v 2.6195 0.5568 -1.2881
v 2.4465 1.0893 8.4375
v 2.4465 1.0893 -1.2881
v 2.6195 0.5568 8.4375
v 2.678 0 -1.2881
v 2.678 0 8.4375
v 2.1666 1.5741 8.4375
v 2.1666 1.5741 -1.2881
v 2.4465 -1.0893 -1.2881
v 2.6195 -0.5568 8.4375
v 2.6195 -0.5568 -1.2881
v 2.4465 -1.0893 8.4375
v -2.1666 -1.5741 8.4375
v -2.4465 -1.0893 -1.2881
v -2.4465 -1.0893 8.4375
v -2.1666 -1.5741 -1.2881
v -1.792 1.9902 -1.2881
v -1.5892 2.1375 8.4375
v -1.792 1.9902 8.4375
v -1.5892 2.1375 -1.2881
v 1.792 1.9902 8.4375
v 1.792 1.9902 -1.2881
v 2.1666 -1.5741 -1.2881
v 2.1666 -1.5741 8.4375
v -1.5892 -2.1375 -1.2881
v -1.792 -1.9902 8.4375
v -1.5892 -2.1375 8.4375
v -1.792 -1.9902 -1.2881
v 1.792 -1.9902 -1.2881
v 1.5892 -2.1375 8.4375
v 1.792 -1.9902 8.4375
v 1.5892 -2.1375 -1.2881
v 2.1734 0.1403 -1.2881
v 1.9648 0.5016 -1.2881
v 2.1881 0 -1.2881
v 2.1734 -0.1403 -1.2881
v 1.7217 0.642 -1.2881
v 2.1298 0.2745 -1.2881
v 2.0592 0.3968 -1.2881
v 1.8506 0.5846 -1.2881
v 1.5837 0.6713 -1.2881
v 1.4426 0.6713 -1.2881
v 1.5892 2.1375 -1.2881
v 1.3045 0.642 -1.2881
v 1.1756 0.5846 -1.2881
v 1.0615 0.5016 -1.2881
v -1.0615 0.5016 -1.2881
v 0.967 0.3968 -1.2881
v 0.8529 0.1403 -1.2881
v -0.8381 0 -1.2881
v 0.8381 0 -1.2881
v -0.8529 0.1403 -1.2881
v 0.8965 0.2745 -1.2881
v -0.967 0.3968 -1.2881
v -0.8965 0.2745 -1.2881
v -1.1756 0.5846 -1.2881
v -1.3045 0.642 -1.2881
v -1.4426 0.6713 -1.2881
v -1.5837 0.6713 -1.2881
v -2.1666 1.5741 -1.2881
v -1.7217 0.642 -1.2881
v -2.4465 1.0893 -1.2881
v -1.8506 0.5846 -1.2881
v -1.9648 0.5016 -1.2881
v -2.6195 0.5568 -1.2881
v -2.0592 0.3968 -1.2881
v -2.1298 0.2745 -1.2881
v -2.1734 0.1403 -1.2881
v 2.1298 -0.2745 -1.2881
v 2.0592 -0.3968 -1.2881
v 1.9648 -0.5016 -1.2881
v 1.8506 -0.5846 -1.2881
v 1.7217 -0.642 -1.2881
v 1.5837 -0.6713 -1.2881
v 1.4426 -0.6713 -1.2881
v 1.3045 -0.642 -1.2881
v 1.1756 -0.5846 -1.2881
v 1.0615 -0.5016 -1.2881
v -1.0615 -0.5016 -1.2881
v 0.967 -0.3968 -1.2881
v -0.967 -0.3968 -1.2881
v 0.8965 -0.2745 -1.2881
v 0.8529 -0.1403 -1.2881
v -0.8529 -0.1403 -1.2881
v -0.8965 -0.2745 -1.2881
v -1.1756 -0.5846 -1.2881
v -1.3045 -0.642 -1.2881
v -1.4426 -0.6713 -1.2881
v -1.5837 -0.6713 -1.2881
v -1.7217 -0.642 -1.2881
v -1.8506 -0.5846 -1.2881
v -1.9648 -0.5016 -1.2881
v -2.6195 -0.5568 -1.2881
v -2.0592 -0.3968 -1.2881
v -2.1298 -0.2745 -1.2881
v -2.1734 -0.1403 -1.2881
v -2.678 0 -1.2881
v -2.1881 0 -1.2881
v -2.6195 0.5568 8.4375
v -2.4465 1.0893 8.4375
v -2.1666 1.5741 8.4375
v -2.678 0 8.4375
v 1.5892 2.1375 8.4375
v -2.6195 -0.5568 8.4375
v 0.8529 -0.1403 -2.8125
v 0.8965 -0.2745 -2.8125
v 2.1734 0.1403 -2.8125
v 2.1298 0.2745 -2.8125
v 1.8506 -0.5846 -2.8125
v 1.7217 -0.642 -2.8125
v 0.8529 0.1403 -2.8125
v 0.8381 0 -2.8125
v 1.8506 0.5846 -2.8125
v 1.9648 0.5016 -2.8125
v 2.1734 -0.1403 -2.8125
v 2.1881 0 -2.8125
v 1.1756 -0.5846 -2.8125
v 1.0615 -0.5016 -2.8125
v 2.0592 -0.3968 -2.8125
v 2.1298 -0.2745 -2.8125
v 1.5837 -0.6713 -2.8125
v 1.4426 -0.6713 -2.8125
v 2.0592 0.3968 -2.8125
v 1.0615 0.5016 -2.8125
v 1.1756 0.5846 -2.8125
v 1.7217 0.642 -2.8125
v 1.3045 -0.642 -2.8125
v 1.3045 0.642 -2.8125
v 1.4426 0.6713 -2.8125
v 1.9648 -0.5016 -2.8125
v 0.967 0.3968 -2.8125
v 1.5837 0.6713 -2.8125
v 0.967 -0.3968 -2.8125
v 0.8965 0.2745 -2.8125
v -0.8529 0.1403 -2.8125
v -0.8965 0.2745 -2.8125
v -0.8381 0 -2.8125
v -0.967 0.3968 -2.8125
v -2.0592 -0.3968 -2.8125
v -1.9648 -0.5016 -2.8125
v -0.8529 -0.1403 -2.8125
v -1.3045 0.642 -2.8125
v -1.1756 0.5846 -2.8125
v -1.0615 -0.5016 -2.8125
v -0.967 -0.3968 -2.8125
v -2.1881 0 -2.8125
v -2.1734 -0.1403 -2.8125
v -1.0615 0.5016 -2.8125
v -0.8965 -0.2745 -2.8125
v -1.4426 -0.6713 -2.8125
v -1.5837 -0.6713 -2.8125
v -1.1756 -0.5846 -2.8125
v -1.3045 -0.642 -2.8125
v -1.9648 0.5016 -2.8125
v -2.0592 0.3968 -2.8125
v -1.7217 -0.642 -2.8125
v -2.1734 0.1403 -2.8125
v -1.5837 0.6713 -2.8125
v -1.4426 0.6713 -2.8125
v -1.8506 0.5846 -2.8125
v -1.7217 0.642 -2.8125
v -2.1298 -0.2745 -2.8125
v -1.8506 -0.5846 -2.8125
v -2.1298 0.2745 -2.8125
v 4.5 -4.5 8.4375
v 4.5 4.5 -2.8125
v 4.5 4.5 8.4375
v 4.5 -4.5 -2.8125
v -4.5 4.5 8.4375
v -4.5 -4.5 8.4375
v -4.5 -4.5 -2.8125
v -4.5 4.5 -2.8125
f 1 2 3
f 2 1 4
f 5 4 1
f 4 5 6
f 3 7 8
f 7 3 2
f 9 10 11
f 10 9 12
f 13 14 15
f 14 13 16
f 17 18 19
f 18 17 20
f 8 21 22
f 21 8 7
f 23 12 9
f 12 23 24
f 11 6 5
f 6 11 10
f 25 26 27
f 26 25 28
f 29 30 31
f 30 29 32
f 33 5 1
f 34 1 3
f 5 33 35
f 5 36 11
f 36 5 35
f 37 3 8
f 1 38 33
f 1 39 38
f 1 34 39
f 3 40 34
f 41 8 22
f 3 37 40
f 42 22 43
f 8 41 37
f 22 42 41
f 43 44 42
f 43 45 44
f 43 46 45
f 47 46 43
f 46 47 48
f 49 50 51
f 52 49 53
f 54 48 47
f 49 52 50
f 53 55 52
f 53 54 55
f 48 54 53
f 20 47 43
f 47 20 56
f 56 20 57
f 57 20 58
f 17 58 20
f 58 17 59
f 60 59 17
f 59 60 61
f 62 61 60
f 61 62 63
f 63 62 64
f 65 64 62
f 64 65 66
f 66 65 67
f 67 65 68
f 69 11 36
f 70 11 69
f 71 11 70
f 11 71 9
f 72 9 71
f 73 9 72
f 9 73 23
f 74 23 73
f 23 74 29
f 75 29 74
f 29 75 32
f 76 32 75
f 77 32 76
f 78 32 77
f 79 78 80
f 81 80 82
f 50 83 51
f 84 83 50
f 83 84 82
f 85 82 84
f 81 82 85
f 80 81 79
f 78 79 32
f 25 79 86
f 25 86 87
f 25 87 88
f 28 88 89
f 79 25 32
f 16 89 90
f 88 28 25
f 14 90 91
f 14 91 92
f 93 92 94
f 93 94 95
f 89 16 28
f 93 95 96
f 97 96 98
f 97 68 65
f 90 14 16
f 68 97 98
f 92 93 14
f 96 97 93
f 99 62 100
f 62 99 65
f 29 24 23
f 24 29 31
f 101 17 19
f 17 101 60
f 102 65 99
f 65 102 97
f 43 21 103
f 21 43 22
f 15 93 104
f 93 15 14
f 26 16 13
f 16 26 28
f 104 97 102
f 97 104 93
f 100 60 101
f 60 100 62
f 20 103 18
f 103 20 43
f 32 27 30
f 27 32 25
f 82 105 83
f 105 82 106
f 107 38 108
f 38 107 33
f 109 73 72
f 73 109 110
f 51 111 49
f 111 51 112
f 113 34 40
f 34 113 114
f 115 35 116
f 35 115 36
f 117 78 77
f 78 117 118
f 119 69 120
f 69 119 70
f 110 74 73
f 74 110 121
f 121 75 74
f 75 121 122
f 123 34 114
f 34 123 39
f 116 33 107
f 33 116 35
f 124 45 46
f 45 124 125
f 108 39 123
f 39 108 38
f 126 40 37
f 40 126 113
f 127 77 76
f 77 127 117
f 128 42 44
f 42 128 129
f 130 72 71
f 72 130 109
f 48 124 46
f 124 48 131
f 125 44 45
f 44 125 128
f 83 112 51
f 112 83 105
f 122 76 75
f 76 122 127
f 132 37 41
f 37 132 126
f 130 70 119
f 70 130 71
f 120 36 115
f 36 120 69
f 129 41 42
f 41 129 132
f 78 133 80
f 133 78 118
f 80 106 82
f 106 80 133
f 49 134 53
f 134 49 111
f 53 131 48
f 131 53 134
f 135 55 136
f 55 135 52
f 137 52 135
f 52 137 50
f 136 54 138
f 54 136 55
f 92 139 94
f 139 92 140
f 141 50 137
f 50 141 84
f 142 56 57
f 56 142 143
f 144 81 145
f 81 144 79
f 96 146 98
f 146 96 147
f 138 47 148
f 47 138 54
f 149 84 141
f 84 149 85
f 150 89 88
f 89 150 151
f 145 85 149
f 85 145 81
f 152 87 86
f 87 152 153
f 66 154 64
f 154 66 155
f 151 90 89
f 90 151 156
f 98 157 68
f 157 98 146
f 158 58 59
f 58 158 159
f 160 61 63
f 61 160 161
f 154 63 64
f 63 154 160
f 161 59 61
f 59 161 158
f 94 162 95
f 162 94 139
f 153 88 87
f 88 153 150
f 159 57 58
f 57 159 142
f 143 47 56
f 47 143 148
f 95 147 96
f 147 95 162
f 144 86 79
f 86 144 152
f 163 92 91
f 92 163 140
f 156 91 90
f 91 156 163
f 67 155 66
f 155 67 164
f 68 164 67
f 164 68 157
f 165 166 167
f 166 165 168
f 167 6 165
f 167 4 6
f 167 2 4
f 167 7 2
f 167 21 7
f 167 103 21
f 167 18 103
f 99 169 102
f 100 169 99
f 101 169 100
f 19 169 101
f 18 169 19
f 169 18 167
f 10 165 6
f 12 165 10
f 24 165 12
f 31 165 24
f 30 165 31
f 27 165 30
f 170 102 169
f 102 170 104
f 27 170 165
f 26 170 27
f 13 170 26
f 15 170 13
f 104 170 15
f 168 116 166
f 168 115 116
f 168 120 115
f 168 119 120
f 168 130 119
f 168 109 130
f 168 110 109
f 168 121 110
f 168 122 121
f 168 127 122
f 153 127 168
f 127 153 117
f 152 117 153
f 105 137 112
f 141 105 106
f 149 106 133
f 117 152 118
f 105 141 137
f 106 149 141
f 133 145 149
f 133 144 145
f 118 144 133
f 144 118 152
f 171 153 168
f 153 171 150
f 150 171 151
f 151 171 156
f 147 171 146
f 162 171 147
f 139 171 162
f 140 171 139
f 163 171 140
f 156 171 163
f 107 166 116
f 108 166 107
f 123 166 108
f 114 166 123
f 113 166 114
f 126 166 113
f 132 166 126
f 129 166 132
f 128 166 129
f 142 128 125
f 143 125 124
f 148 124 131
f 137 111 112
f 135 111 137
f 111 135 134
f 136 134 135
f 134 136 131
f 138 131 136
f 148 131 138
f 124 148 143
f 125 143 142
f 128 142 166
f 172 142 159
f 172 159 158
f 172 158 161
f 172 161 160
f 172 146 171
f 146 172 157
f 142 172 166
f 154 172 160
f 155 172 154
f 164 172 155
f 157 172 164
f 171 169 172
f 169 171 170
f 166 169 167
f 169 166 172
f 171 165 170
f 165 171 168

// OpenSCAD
$fn = 30;

resize([9,0,0], auto=true) difference() {
    translate([-4,-4,-2.5]) cube([8,8,10]);
    union() {
        intersection() {
            translate([0,0,-(2.29/2)]) cylinder(h=10, r=4.88/2.05);
            translate([-4.88/2,-3.8/2,-2.29/2]) cube([4.88,3.8,10]);
        }

        translate([2.69/2,0,-49]) cylinder(h=50, r=0.6);
        translate([-2.69/2,0,-49]) cylinder(h=50, r=0.6);
    }
}
